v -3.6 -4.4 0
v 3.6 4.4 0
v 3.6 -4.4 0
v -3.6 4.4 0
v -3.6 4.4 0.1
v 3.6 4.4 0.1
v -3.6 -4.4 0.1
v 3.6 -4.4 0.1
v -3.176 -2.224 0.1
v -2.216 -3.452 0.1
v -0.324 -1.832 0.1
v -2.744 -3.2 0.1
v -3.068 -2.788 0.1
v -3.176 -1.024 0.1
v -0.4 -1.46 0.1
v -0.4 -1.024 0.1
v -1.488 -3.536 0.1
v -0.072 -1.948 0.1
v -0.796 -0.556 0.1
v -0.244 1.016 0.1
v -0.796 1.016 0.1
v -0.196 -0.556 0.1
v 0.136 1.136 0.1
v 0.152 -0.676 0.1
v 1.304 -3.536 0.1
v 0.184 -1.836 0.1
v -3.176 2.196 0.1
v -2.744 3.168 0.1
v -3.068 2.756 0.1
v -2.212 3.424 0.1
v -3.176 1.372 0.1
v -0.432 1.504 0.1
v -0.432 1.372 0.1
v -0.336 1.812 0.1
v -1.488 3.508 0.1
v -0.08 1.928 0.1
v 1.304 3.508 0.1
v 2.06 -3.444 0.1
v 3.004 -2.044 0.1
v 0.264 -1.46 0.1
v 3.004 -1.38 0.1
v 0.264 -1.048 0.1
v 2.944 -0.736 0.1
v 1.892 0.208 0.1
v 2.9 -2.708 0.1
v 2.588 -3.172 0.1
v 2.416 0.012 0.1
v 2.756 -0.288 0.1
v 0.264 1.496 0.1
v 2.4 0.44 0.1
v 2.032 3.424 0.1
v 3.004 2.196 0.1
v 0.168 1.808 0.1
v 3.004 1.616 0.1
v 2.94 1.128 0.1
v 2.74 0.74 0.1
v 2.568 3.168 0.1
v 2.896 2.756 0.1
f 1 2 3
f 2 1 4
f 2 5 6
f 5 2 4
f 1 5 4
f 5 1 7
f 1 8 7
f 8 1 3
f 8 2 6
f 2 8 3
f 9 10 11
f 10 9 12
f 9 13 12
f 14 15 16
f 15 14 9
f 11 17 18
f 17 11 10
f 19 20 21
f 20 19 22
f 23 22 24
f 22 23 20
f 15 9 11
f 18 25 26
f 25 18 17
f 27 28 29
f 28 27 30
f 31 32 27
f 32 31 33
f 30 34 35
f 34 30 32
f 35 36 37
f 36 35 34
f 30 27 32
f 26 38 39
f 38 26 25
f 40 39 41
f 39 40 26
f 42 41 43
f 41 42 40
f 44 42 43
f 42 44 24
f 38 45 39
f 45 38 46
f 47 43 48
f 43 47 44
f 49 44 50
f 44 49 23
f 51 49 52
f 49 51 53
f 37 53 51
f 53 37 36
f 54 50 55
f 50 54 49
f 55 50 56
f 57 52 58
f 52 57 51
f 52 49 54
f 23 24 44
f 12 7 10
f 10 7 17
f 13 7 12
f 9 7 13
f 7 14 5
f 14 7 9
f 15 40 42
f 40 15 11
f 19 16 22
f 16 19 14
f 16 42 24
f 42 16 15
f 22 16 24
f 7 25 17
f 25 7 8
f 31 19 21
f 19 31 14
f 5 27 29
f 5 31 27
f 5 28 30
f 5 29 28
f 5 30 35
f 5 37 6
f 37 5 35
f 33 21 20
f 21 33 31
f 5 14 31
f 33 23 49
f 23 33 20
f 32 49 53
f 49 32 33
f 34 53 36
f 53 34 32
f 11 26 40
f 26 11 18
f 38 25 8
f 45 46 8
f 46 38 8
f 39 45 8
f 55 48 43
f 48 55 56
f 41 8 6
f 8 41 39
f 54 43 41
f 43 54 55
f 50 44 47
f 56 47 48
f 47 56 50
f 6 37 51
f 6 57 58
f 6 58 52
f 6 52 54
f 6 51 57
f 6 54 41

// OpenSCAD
// file: ../p/box5-12.scad
use <../lib.scad>
function ldraw_lib__box5_12() = [
// 0 Box with 5 Faces without Any Edges
// 0 Name: box5-12.dat
// 0 Author: Chris Dee [cwdee]
// 0 !LDRAW_ORG Primitive UPDATE 2009-02
// 0 !LICENSE Licensed under CC BY 4.0 : see CAreadme.txt
// 
// 0 BFC CERTIFY CCW
  [0,"BFC","CERTIFY"],
  [0,"BFC","CCW"],
// 
// 0 !HISTORY 2009-09-03 [PTadmin] Official Update 2009-02
// 
// 
// 4 16 1 1 1 1 1 -1 -1 1 -1 -1 1 1
  [4,16,1,1,1,1,1,-1,-1,1,-1,-1,1,1],
// 4 16 -1 0 1 1 0 1 1 1 1 -1 1 1
  [4,16,-1,0,1,1,0,1,1,1,1,-1,1,1],
// 4 16 -1 0 -1 -1 0 1 -1 1 1 -1 1 -1
  [4,16,-1,0,-1,-1,0,1,-1,1,1,-1,1,-1],
// 4 16 1 0 -1 -1 0 -1 -1 1 -1 1 1 -1
  [4,16,1,0,-1,-1,0,-1,-1,1,-1,1,1,-1],
// 4 16 1 0 1 1 0 -1 1 1 -1 1 1 1
  [4,16,1,0,1,1,0,-1,1,1,-1,1,1,1],
// 0
];
module ldraw_lib__box5_12(step=0, col=false, unit=2/5, alt=false, line=0.2, solid=!$preview)
    makepoly(ldraw_lib__box5_12(), step=step, col=col, unit=unit, alt=alt, line=line, solid=solid);
ldraw_lib__box5_12(line=0.2);
// main file
use <../lib.scad>
use <../p/box5-12.scad>
function ldraw_lib__820673p() = [
// 0 Sticker  1.1 x  0.9 with Black Bold "3" on White Background
// 0 Name: 820673p.dat
// 0 Author: Takeshi Takahashi [RainbowDolphin]
// 0 !LDRAW_ORG Part UPDATE 2022-06
// 0 !LICENSE Licensed under CC BY 4.0 : see CAreadme.txt
// 
// 0 BFC CERTIFY CCW
  [0,"BFC","CERTIFY"],
  [0,"BFC","CCW"],
// 
// 0 !KEYWORDS Bricklink 6542stk01, Brickowl 602283, harbour, Pier
// 0 !KEYWORDS Rebrickable 820673, Seaport, Set 6542, wharf
// 
// 0 !HISTORY 2022-12-20 [PTadmin] Official Update 2022-06
// 
// 
// 1 16 0 -0.25 0 9 0 0 0 0.25 0 0 0 11 box5-12.dat
  [1,16,0,-0.25,0,9,0,0,0,0.25,0,0,0,11, ldraw_lib__box5_12()],
// 4 0 -7.94 -0.25 -5.56 -6.86 -0.25 -8 -5.54 -0.25 -8.63 -0.81 -0.25 -4.58
  [4,0,-7.94,-0.25,-5.56,-6.86,-0.25,-8,-5.54,-0.25,-8.63,-0.81,-0.25,-4.58],
// 3 0 -7.94 -0.25 -5.56 -7.67 -0.25 -6.97 -6.86 -0.25 -8
  [3,0,-7.94,-0.25,-5.56,-7.67,-0.25,-6.97,-6.86,-0.25,-8],
// 4 0 -7.94 -0.25 -2.56 -7.94 -0.25 -5.56 -1 -0.25 -3.65 -1 -0.25 -2.56
  [4,0,-7.94,-0.25,-2.56,-7.94,-0.25,-5.56,-1,-0.25,-3.65,-1,-0.25,-2.56],
// 4 0 -0.81 -0.25 -4.58 -5.54 -0.25 -8.63 -3.72 -0.25 -8.84 -0.18 -0.25 -4.87
  [4,0,-0.81,-0.25,-4.58,-5.54,-0.25,-8.63,-3.72,-0.25,-8.84,-0.18,-0.25,-4.87],
// 4 0 -1.99 -0.25 -1.39 -0.49 -0.25 -1.39 -0.61 -0.25 2.54 -1.99 -0.25 2.54
  [4,0,-1.99,-0.25,-1.39,-0.49,-0.25,-1.39,-0.61,-0.25,2.54,-1.99,-0.25,2.54],
// 4 0 -0.49 -0.25 -1.39 0.38 -0.25 -1.69 0.34 -0.25 2.84 -0.61 -0.25 2.54
  [4,0,-0.49,-0.25,-1.39,0.38,-0.25,-1.69,0.34,-0.25,2.84,-0.61,-0.25,2.54],
// 3 0 -1 -0.25 -3.65 -7.94 -0.25 -5.56 -0.81 -0.25 -4.58
  [3,0,-1,-0.25,-3.65,-7.94,-0.25,-5.56,-0.81,-0.25,-4.58],
// 4 0 -0.18 -0.25 -4.87 -3.72 -0.25 -8.84 3.26 -0.25 -8.84 0.46 -0.25 -4.59
  [4,0,-0.18,-0.25,-4.87,-3.72,-0.25,-8.84,3.26,-0.25,-8.84,0.46,-0.25,-4.59],
// 4 0 -6.86 -0.25 7.92 -7.67 -0.25 6.89 -7.94 -0.25 5.49 -5.53 -0.25 8.56
  [4,0,-6.86,-0.25,7.92,-7.67,-0.25,6.89,-7.94,-0.25,5.49,-5.53,-0.25,8.56],
// 4 0 -7.94 -0.25 3.43 -1.08 -0.25 3.43 -1.08 -0.25 3.76 -7.94 -0.25 5.49
  [4,0,-7.94,-0.25,3.43,-1.08,-0.25,3.43,-1.08,-0.25,3.76,-7.94,-0.25,5.49],
// 4 0 -0.84 -0.25 4.53 -3.72 -0.25 8.77 -5.53 -0.25 8.56 -1.08 -0.25 3.76
  [4,0,-0.84,-0.25,4.53,-3.72,-0.25,8.77,-5.53,-0.25,8.56,-1.08,-0.25,3.76],
// 4 0 -3.72 -0.25 8.77 -0.84 -0.25 4.53 -0.2 -0.25 4.82 3.26 -0.25 8.77
  [4,0,-3.72,-0.25,8.77,-0.84,-0.25,4.53,-0.2,-0.25,4.82,3.26,-0.25,8.77],
// 3 0 -5.53 -0.25 8.56 -7.94 -0.25 5.49 -1.08 -0.25 3.76
  [3,0,-5.53,-0.25,8.56,-7.94,-0.25,5.49,-1.08,-0.25,3.76],
// 4 0 0.46 -0.25 -4.59 3.26 -0.25 -8.84 5.15 -0.25 -8.61 7.51 -0.25 -5.11
  [4,0,0.46,-0.25,-4.59,3.26,-0.25,-8.84,5.15,-0.25,-8.61,7.51,-0.25,-5.11],
// 4 0 0.66 -0.25 -3.65 0.46 -0.25 -4.59 7.51 -0.25 -5.11 7.51 -0.25 -3.45
  [4,0,0.66,-0.25,-3.65,0.46,-0.25,-4.59,7.51,-0.25,-5.11,7.51,-0.25,-3.45],
// 4 0 0.66 -0.25 -2.62 0.66 -0.25 -3.65 7.51 -0.25 -3.45 7.36 -0.25 -1.84
  [4,0,0.66,-0.25,-2.62,0.66,-0.25,-3.65,7.51,-0.25,-3.45,7.36,-0.25,-1.84],
// 4 0 4.73 -0.25 0.52 0.38 -0.25 -1.69 0.66 -0.25 -2.62 7.36 -0.25 -1.84
  [4,0,4.73,-0.25,0.52,0.38,-0.25,-1.69,0.66,-0.25,-2.62,7.36,-0.25,-1.84],
// 4 0 7.25 -0.25 -6.77 7.51 -0.25 -5.11 5.15 -0.25 -8.61 6.47 -0.25 -7.93
  [4,0,7.25,-0.25,-6.77,7.51,-0.25,-5.11,5.15,-0.25,-8.61,6.47,-0.25,-7.93],
// 4 0 7.36 -0.25 -1.84 6.89 -0.25 -0.72 6.04 -0.25 0.03 4.73 -0.25 0.52
  [4,0,7.36,-0.25,-1.84,6.89,-0.25,-0.72,6.04,-0.25,0.03,4.73,-0.25,0.52],
// 4 0 4.73 -0.25 0.52 6 -0.25 1.1 0.66 -0.25 3.74 0.34 -0.25 2.84
  [4,0,4.73,-0.25,0.52,6,-0.25,1.1,0.66,-0.25,3.74,0.34,-0.25,2.84],
// 4 0 0.66 -0.25 3.74 7.51 -0.25 5.49 5.08 -0.25 8.56 0.42 -0.25 4.52
  [4,0,0.66,-0.25,3.74,7.51,-0.25,5.49,5.08,-0.25,8.56,0.42,-0.25,4.52],
// 4 0 0.42 -0.25 4.52 5.08 -0.25 8.56 3.26 -0.25 8.77 -0.2 -0.25 4.82
  [4,0,0.42,-0.25,4.52,5.08,-0.25,8.56,3.26,-0.25,8.77,-0.2,-0.25,4.82],
// 4 0 7.51 -0.25 4.04 0.66 -0.25 3.74 6 -0.25 1.1 7.35 -0.25 2.82
  [4,0,7.51,-0.25,4.04,0.66,-0.25,3.74,6,-0.25,1.1,7.35,-0.25,2.82],
// 3 0 7.35 -0.25 2.82 6 -0.25 1.1 6.85 -0.25 1.85
  [3,0,7.35,-0.25,2.82,6,-0.25,1.1,6.85,-0.25,1.85],
// 4 0 7.51 -0.25 5.49 7.24 -0.25 6.89 6.42 -0.25 7.92 5.08 -0.25 8.56
  [4,0,7.51,-0.25,5.49,7.24,-0.25,6.89,6.42,-0.25,7.92,5.08,-0.25,8.56],
// 3 0 7.51 -0.25 5.49 0.66 -0.25 3.74 7.51 -0.25 4.04
  [3,0,7.51,-0.25,5.49,0.66,-0.25,3.74,7.51,-0.25,4.04],
// 3 0 0.34 -0.25 2.84 0.38 -0.25 -1.69 4.73 -0.25 0.52
  [3,0,0.34,-0.25,2.84,0.38,-0.25,-1.69,4.73,-0.25,0.52],
// 3 15 -6.86 -0.25 -8 -9 -0.25 -11 -5.54 -0.25 -8.63
  [3,15,-6.86,-0.25,-8,-9,-0.25,-11,-5.54,-0.25,-8.63],
// 3 15 -5.54 -0.25 -8.63 -9 -0.25 -11 -3.72 -0.25 -8.84
  [3,15,-5.54,-0.25,-8.63,-9,-0.25,-11,-3.72,-0.25,-8.84],
// 3 15 -7.67 -0.25 -6.97 -9 -0.25 -11 -6.86 -0.25 -8
  [3,15,-7.67,-0.25,-6.97,-9,-0.25,-11,-6.86,-0.25,-8],
// 3 15 -7.94 -0.25 -5.56 -9 -0.25 -11 -7.67 -0.25 -6.97
  [3,15,-7.94,-0.25,-5.56,-9,-0.25,-11,-7.67,-0.25,-6.97],
// 4 15 -9 -0.25 -11 -7.94 -0.25 -5.56 -7.94 -0.25 -2.56 -9 -0.25 11
  [4,15,-9,-0.25,-11,-7.94,-0.25,-5.56,-7.94,-0.25,-2.56,-9,-0.25,11],
// 4 15 -1 -0.25 -3.65 -0.81 -0.25 -4.58 0.66 -0.25 -3.65 0.66 -0.25 -2.62
  [4,15,-1,-0.25,-3.65,-0.81,-0.25,-4.58,0.66,-0.25,-3.65,0.66,-0.25,-2.62],
// 4 15 -1.99 -0.25 -1.39 -7.94 -0.25 -2.56 -1 -0.25 -2.56 -0.49 -0.25 -1.39
  [4,15,-1.99,-0.25,-1.39,-7.94,-0.25,-2.56,-1,-0.25,-2.56,-0.49,-0.25,-1.39],
// 4 15 -1 -0.25 -2.56 -1 -0.25 -3.65 0.66 -0.25 -2.62 0.38 -0.25 -1.69
  [4,15,-1,-0.25,-2.56,-1,-0.25,-3.65,0.66,-0.25,-2.62,0.38,-0.25,-1.69],
// 3 15 -0.49 -0.25 -1.39 -1 -0.25 -2.56 0.38 -0.25 -1.69
  [3,15,-0.49,-0.25,-1.39,-1,-0.25,-2.56,0.38,-0.25,-1.69],
// 4 15 3.26 -0.25 -8.84 -3.72 -0.25 -8.84 -9 -0.25 -11 9 -0.25 -11
  [4,15,3.26,-0.25,-8.84,-3.72,-0.25,-8.84,-9,-0.25,-11,9,-0.25,-11],
// 4 15 -7.94 -0.25 3.43 -7.94 -0.25 -2.56 -1.99 -0.25 -1.39 -1.99 -0.25 2.54
  [4,15,-7.94,-0.25,3.43,-7.94,-0.25,-2.56,-1.99,-0.25,-1.39,-1.99,-0.25,2.54],
// 3 15 -9 -0.25 11 -7.94 -0.25 5.49 -7.67 -0.25 6.89
  [3,15,-9,-0.25,11,-7.94,-0.25,5.49,-7.67,-0.25,6.89],
// 3 15 -9 -0.25 11 -7.94 -0.25 3.43 -7.94 -0.25 5.49
  [3,15,-9,-0.25,11,-7.94,-0.25,3.43,-7.94,-0.25,5.49],
// 3 15 -9 -0.25 11 -6.86 -0.25 7.92 -5.53 -0.25 8.56
  [3,15,-9,-0.25,11,-6.86,-0.25,7.92,-5.53,-0.25,8.56],
// 3 15 -9 -0.25 11 -7.67 -0.25 6.89 -6.86 -0.25 7.92
  [3,15,-9,-0.25,11,-7.67,-0.25,6.89,-6.86,-0.25,7.92],
// 3 15 -9 -0.25 11 -5.53 -0.25 8.56 -3.72 -0.25 8.77
  [3,15,-9,-0.25,11,-5.53,-0.25,8.56,-3.72,-0.25,8.77],
// 4 15 -9 -0.25 11 -3.72 -0.25 8.77 3.26 -0.25 8.77 9 -0.25 11
  [4,15,-9,-0.25,11,-3.72,-0.25,8.77,3.26,-0.25,8.77,9,-0.25,11],
// 4 15 -1.08 -0.25 3.43 -7.94 -0.25 3.43 -1.99 -0.25 2.54 -0.61 -0.25 2.54
  [4,15,-1.08,-0.25,3.43,-7.94,-0.25,3.43,-1.99,-0.25,2.54,-0.61,-0.25,2.54],
// 3 15 -9 -0.25 11 -7.94 -0.25 -2.56 -7.94 -0.25 3.43
  [3,15,-9,-0.25,11,-7.94,-0.25,-2.56,-7.94,-0.25,3.43],
// 4 15 -1.08 -0.25 3.43 -0.61 -0.25 2.54 0.34 -0.25 2.84 0.66 -0.25 3.74
  [4,15,-1.08,-0.25,3.43,-0.61,-0.25,2.54,0.34,-0.25,2.84,0.66,-0.25,3.74],
// 4 15 -1.08 -0.25 3.76 -1.08 -0.25 3.43 0.66 -0.25 3.74 0.42 -0.25 4.52
  [4,15,-1.08,-0.25,3.76,-1.08,-0.25,3.43,0.66,-0.25,3.74,0.42,-0.25,4.52],
// 4 15 0.42 -0.25 4.52 -0.2 -0.25 4.82 -0.84 -0.25 4.53 -1.08 -0.25 3.76
  [4,15,0.42,-0.25,4.52,-0.2,-0.25,4.82,-0.84,-0.25,4.53,-1.08,-0.25,3.76],
// 4 15 -0.81 -0.25 -4.58 -0.18 -0.25 -4.87 0.46 -0.25 -4.59 0.66 -0.25 -3.65
  [4,15,-0.81,-0.25,-4.58,-0.18,-0.25,-4.87,0.46,-0.25,-4.59,0.66,-0.25,-3.65],
// 3 15 5.15 -0.25 -8.61 3.26 -0.25 -8.84 9 -0.25 -11
  [3,15,5.15,-0.25,-8.61,3.26,-0.25,-8.84,9,-0.25,-11],
// 3 15 7.25 -0.25 -6.77 6.47 -0.25 -7.93 9 -0.25 -11
  [3,15,7.25,-0.25,-6.77,6.47,-0.25,-7.93,9,-0.25,-11],
// 3 15 6.47 -0.25 -7.93 5.15 -0.25 -8.61 9 -0.25 -11
  [3,15,6.47,-0.25,-7.93,5.15,-0.25,-8.61,9,-0.25,-11],
// 3 15 7.51 -0.25 -5.11 7.25 -0.25 -6.77 9 -0.25 -11
  [3,15,7.51,-0.25,-5.11,7.25,-0.25,-6.77,9,-0.25,-11],
// 4 15 6.89 -0.25 -0.72 7.36 -0.25 -1.84 7.35 -0.25 2.82 6.85 -0.25 1.85
  [4,15,6.89,-0.25,-0.72,7.36,-0.25,-1.84,7.35,-0.25,2.82,6.85,-0.25,1.85],
// 4 15 7.51 -0.25 -3.45 7.51 -0.25 -5.11 9 -0.25 -11 9 -0.25 11
  [4,15,7.51,-0.25,-3.45,7.51,-0.25,-5.11,9,-0.25,-11,9,-0.25,11],
// 4 15 7.36 -0.25 -1.84 7.51 -0.25 -3.45 7.51 -0.25 4.04 7.35 -0.25 2.82
  [4,15,7.36,-0.25,-1.84,7.51,-0.25,-3.45,7.51,-0.25,4.04,7.35,-0.25,2.82],
// 3 15 6 -0.25 1.1 4.73 -0.25 0.52 6.04 -0.25 0.03
  [3,15,6,-0.25,1.1,4.73,-0.25,0.52,6.04,-0.25,0.03],
// 4 15 6.85 -0.25 1.85 6 -0.25 1.1 6.04 -0.25 0.03 6.89 -0.25 -0.72
  [4,15,6.85,-0.25,1.85,6,-0.25,1.1,6.04,-0.25,0.03,6.89,-0.25,-0.72],
// 3 15 9 -0.25 11 3.26 -0.25 8.77 5.08 -0.25 8.56
  [3,15,9,-0.25,11,3.26,-0.25,8.77,5.08,-0.25,8.56],
// 3 15 9 -0.25 11 6.42 -0.25 7.92 7.24 -0.25 6.89
  [3,15,9,-0.25,11,6.42,-0.25,7.92,7.24,-0.25,6.89],
// 3 15 9 -0.25 11 7.24 -0.25 6.89 7.51 -0.25 5.49
  [3,15,9,-0.25,11,7.24,-0.25,6.89,7.51,-0.25,5.49],
// 3 15 9 -0.25 11 7.51 -0.25 5.49 7.51 -0.25 4.04
  [3,15,9,-0.25,11,7.51,-0.25,5.49,7.51,-0.25,4.04],
// 3 15 9 -0.25 11 5.08 -0.25 8.56 6.42 -0.25 7.92
  [3,15,9,-0.25,11,5.08,-0.25,8.56,6.42,-0.25,7.92],
// 3 15 9 -0.25 11 7.51 -0.25 4.04 7.51 -0.25 -3.45
  [3,15,9,-0.25,11,7.51,-0.25,4.04,7.51,-0.25,-3.45],
];
module ldraw_lib__820673p(step=0, col=false, unit=2/5, alt=false, line=0.2, solid=!$preview)
    makepoly(ldraw_lib__820673p(), step=step, col=col, unit=unit, alt=alt, line=line, solid=solid);
ldraw_lib__820673p(line=0.2);
